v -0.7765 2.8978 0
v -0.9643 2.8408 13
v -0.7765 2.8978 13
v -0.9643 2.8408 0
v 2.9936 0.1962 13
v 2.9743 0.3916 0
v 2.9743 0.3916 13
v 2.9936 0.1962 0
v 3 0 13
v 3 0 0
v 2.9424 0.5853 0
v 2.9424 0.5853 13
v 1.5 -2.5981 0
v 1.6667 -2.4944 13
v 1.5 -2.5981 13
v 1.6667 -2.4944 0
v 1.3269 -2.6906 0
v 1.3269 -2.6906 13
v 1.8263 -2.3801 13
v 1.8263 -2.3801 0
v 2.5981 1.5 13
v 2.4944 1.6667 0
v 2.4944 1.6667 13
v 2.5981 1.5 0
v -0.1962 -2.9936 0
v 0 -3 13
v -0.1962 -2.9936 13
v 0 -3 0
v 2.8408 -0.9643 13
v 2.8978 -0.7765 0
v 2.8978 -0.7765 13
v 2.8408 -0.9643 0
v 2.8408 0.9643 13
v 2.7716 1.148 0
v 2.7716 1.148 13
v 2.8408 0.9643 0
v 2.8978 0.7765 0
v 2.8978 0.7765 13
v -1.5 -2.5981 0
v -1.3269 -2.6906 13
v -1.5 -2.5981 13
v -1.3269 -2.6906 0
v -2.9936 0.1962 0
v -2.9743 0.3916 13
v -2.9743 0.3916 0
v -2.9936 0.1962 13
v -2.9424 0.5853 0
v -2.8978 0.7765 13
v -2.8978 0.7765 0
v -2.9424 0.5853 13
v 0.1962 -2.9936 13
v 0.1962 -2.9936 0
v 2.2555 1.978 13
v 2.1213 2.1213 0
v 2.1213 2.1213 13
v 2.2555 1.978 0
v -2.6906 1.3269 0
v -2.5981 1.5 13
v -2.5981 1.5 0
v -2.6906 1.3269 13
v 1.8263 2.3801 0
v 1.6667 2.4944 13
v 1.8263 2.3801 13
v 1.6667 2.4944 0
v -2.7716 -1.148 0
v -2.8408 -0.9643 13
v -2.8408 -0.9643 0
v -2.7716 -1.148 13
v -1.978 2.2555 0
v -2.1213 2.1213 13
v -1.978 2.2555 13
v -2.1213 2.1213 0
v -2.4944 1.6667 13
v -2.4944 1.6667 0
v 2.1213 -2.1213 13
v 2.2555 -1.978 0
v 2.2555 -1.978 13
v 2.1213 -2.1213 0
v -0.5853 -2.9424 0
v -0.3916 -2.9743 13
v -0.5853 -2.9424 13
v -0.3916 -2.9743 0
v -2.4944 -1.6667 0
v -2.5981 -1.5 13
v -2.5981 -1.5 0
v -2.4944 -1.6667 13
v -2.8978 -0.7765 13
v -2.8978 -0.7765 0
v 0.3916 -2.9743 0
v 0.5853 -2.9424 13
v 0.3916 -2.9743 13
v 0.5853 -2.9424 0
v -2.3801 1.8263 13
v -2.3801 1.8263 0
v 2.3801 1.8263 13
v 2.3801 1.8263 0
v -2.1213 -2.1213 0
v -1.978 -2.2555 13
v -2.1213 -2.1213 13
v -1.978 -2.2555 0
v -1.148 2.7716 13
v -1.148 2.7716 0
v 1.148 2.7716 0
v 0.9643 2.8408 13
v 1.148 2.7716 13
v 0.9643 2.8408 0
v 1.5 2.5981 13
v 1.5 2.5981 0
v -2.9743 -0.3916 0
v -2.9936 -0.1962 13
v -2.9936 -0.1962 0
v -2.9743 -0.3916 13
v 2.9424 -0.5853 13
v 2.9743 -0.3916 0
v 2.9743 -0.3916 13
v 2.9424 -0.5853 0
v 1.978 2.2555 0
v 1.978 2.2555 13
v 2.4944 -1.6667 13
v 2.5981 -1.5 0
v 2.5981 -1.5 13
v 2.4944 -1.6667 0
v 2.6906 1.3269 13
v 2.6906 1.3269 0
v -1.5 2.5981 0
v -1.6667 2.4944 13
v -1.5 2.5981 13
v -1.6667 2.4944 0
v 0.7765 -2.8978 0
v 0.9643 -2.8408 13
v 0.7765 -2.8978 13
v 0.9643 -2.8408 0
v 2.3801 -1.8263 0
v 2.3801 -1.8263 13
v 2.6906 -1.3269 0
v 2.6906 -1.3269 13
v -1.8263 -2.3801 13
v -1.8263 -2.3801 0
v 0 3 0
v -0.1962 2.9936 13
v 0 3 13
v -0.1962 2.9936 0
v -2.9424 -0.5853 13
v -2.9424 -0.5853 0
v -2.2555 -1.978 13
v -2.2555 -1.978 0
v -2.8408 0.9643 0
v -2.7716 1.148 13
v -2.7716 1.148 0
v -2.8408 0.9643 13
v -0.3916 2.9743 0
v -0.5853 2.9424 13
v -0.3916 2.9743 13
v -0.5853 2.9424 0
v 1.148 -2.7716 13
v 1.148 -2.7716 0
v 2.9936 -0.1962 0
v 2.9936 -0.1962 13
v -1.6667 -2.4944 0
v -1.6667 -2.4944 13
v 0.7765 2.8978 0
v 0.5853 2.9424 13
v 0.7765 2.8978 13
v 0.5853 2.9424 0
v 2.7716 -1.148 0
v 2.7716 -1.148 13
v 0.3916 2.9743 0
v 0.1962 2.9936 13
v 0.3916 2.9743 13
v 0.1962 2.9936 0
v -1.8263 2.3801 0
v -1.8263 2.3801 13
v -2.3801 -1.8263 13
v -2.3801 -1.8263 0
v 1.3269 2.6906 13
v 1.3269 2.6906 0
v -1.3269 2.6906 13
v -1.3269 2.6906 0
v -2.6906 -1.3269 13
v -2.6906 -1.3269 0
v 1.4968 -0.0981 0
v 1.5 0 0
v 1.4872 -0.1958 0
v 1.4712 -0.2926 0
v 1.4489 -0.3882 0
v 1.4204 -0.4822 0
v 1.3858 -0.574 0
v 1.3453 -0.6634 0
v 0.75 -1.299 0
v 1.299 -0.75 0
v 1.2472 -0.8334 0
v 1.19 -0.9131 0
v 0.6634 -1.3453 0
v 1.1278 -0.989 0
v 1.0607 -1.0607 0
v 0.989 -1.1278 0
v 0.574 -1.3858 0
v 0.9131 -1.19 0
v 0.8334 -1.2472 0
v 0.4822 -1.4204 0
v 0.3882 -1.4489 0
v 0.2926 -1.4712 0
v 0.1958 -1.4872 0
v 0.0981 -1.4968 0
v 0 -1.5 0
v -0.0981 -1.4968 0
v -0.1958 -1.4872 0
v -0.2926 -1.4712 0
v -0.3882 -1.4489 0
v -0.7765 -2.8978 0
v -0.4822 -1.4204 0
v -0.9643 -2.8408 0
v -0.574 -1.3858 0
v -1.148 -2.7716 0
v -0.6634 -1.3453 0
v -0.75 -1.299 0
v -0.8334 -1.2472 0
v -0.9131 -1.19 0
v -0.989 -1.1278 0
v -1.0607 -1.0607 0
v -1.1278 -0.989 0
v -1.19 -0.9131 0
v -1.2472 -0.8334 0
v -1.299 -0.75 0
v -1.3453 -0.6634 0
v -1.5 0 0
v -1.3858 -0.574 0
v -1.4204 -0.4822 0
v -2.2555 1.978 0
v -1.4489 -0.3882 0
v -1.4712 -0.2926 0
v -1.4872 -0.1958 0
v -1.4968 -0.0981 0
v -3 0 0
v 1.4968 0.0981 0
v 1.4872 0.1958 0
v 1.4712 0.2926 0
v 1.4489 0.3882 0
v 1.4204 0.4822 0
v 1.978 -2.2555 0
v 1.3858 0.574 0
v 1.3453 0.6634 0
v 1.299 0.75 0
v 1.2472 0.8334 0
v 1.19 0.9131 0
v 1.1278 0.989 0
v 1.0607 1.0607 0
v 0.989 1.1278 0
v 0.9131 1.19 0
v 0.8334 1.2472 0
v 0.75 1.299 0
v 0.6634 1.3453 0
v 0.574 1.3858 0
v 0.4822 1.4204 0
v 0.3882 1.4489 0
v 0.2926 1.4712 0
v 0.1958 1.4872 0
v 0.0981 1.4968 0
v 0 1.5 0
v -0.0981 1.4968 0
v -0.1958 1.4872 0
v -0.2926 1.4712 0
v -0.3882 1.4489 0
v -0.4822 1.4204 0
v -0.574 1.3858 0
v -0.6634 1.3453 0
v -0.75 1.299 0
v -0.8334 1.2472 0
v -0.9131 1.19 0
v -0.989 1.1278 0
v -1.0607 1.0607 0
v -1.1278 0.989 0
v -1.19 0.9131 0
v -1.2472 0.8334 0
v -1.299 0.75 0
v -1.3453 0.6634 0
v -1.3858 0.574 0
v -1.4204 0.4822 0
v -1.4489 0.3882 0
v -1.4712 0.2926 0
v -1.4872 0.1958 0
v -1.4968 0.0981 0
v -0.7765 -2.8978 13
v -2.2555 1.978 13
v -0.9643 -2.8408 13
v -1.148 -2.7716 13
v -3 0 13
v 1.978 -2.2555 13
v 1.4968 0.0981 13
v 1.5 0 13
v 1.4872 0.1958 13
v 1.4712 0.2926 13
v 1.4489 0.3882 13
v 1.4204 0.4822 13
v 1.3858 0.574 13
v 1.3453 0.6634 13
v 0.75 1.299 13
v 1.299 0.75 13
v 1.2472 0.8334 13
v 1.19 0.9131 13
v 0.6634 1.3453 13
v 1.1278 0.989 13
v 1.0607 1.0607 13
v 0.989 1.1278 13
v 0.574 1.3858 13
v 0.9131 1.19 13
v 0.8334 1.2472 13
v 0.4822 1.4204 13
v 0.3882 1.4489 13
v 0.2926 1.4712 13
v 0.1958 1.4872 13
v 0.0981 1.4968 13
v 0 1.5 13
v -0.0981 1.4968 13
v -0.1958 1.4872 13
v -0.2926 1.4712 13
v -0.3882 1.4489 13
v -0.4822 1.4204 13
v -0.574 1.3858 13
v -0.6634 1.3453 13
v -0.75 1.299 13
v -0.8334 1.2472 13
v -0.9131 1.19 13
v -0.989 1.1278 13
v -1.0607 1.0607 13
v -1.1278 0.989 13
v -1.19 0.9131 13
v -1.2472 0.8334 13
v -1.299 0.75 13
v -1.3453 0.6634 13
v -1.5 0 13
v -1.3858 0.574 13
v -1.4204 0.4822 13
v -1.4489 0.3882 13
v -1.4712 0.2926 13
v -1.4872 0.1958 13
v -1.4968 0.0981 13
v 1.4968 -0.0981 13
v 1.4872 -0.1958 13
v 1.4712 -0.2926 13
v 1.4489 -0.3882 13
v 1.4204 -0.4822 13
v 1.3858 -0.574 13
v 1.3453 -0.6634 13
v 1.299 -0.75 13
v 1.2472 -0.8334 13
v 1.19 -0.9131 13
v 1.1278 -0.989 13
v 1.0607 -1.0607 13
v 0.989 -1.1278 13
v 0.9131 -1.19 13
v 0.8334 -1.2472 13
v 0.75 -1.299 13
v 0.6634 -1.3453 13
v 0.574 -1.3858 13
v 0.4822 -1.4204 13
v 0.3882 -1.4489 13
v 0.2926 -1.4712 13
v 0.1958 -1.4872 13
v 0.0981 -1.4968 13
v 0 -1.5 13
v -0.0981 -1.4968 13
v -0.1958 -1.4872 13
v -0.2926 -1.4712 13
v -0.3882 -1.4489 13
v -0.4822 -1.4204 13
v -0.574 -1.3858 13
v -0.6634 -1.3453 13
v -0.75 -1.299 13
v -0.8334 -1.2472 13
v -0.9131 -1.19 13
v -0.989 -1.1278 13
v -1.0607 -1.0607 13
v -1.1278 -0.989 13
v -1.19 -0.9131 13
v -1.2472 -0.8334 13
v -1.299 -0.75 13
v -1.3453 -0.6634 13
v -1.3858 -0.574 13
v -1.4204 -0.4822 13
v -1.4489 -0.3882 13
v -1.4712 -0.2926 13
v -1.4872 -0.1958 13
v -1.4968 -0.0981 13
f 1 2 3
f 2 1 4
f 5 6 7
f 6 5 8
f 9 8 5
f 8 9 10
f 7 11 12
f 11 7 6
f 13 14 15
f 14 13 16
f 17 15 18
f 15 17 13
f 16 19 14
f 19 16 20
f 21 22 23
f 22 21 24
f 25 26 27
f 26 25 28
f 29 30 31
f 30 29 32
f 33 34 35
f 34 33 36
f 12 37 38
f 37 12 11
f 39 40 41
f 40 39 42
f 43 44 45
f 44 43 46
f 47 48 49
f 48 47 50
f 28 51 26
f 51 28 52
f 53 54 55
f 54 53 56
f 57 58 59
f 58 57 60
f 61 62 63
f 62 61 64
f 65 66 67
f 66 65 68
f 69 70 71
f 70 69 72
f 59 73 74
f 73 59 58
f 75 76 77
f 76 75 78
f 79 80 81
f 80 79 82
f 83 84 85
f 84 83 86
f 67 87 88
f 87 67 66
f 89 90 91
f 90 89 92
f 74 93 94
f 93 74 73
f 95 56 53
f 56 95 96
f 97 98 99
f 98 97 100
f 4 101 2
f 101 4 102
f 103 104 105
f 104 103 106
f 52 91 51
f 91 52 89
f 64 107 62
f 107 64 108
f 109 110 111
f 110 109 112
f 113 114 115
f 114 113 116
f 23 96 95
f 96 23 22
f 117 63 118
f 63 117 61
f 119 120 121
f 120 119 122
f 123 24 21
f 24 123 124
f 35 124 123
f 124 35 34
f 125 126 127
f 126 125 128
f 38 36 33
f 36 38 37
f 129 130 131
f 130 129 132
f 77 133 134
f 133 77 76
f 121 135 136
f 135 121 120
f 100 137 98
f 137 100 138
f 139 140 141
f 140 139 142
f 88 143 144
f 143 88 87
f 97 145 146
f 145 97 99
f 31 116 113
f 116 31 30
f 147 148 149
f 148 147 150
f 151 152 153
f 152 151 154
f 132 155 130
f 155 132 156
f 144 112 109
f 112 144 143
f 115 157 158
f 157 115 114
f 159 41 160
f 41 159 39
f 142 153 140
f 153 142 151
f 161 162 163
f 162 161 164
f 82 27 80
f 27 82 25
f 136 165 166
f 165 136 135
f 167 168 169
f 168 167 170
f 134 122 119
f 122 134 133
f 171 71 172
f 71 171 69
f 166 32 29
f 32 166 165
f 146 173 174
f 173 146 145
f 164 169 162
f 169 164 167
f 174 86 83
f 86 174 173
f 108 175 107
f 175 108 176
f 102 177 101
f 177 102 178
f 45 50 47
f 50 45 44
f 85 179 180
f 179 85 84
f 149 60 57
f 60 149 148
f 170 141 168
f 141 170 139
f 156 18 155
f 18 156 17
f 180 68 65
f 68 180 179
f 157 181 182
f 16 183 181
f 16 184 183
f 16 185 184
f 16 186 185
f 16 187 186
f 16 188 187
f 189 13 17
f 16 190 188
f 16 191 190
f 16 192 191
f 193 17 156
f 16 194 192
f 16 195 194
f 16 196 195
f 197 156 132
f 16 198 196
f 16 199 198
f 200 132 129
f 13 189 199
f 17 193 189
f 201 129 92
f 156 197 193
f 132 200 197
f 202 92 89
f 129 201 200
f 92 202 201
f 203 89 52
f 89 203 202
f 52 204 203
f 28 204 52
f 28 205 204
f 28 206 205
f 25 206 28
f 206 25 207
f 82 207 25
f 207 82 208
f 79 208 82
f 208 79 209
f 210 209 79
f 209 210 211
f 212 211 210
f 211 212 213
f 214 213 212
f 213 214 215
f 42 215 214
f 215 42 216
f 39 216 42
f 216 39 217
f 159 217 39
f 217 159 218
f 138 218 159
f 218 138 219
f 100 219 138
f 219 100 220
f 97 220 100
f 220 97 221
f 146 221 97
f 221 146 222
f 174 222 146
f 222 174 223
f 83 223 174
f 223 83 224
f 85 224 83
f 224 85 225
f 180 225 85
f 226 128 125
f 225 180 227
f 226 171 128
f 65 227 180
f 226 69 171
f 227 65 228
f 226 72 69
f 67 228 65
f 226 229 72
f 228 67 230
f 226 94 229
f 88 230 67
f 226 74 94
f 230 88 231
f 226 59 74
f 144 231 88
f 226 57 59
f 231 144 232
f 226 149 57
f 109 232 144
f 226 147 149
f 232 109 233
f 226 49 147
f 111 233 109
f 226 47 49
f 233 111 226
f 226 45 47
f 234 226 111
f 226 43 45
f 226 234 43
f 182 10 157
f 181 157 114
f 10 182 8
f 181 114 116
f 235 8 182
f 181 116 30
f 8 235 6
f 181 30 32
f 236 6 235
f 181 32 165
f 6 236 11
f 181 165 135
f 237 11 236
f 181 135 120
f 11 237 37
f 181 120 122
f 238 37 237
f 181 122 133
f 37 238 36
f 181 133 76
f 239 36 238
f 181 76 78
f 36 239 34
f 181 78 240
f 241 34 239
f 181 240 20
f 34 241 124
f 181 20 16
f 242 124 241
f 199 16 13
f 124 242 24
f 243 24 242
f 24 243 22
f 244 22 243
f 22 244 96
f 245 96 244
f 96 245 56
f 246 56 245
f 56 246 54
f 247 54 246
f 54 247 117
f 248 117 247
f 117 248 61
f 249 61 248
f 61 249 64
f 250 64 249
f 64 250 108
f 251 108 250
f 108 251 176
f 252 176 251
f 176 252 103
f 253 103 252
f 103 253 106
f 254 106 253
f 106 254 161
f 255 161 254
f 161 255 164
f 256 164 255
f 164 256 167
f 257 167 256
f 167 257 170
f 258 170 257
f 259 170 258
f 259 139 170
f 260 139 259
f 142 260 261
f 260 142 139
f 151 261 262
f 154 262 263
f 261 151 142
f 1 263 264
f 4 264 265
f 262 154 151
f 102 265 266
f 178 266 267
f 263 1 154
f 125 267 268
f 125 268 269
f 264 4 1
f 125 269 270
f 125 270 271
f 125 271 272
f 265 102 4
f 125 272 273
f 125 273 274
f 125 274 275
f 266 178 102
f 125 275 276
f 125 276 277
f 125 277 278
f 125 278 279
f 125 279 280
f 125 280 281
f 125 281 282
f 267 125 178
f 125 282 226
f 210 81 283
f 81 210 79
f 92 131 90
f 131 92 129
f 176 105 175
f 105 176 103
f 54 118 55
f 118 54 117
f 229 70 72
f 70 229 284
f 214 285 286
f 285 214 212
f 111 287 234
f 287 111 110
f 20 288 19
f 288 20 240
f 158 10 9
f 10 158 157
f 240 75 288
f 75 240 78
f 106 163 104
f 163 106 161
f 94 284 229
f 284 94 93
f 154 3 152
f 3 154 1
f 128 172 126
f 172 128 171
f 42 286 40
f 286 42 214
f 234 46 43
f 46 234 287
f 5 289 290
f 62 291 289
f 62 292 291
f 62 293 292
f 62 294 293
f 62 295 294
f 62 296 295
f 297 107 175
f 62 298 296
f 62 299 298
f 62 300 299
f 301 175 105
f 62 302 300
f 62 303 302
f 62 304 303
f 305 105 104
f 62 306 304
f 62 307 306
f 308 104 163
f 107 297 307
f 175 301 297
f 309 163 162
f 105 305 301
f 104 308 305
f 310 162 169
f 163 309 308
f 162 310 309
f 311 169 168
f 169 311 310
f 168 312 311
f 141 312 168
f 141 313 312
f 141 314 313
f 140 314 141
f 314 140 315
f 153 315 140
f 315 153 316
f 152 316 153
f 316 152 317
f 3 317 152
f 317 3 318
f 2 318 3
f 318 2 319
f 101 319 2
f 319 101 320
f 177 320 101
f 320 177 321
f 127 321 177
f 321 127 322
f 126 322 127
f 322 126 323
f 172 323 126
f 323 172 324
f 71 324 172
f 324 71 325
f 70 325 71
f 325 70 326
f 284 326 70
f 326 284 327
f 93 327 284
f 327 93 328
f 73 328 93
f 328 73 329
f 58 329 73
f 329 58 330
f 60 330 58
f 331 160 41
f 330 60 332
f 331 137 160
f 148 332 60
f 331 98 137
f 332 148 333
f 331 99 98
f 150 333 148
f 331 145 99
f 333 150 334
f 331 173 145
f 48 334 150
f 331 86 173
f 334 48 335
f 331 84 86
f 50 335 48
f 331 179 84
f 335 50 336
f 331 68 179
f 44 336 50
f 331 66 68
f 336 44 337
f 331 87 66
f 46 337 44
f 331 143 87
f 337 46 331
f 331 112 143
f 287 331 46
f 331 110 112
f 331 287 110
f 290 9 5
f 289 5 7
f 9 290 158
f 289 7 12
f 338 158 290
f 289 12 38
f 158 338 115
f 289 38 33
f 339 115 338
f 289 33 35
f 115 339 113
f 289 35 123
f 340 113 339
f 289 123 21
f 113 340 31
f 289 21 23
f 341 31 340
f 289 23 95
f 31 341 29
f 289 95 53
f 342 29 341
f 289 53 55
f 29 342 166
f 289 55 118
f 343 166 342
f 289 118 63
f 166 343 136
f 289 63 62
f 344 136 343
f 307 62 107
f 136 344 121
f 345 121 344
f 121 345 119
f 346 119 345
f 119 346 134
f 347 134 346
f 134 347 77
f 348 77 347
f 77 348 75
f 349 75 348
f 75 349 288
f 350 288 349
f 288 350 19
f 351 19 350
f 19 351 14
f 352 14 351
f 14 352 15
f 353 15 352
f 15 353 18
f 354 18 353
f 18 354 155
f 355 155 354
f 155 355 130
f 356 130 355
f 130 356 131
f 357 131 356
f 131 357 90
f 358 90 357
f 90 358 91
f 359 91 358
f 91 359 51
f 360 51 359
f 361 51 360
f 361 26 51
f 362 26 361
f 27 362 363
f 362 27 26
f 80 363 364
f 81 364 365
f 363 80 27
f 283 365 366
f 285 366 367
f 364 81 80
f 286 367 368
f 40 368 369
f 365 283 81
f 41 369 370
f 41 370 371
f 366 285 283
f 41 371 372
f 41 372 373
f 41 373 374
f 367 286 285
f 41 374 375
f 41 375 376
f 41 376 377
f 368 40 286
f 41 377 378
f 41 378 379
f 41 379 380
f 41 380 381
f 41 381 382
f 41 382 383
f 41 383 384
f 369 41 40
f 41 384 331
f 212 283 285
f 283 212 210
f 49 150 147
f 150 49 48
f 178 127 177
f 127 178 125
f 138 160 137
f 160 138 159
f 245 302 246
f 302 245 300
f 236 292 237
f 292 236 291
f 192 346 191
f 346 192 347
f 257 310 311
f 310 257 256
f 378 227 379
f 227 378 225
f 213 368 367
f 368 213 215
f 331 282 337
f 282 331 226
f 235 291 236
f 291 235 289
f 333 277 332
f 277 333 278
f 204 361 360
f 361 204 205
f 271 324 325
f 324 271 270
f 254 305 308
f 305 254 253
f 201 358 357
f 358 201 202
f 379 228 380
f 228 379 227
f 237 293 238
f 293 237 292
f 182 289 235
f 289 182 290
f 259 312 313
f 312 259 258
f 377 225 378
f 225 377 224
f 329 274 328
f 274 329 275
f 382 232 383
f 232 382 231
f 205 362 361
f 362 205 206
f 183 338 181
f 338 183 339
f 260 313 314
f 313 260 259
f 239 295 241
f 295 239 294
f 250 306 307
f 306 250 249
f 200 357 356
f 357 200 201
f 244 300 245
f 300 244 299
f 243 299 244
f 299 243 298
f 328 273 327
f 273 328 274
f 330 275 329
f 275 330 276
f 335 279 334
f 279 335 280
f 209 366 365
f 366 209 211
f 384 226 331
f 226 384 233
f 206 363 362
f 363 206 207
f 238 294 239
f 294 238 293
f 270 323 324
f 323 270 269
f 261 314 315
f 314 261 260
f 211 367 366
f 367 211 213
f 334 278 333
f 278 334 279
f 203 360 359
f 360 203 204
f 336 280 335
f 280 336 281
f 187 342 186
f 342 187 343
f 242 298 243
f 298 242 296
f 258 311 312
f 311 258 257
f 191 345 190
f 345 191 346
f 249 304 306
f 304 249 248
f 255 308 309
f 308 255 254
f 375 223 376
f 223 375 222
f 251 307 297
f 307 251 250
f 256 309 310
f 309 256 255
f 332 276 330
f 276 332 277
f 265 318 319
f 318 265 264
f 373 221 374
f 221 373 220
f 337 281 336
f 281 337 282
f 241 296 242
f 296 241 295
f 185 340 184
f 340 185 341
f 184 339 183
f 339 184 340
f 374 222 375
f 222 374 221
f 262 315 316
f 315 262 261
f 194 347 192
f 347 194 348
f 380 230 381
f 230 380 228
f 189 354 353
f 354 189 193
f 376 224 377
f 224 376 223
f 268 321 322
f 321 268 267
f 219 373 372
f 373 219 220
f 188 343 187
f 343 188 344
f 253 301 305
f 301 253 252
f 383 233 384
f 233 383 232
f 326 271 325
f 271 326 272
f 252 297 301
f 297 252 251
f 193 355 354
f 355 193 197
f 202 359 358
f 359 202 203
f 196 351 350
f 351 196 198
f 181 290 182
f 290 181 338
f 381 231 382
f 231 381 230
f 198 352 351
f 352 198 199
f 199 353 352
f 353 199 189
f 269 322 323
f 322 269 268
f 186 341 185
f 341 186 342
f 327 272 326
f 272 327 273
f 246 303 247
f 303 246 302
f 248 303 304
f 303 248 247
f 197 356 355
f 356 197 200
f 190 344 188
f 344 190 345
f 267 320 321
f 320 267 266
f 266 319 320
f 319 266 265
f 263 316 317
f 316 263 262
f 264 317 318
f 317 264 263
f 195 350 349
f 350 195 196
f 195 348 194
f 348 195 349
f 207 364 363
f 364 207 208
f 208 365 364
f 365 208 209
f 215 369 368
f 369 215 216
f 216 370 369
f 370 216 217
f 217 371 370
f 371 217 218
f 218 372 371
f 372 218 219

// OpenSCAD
$fn=96;

thread_d = 3.0;      // mm (nominal)
length   = 13.0;     // mm
outer_d  = 6.0;      // mm (assumed since diameter was "None")
hole_d   = 3.0;      // mm (clearance for M3-ish)

difference() {
  cylinder(h=length, d=outer_d);
  translate([0,0,-0.2]) cylinder(h=length+0.4, d=hole_d);
}
